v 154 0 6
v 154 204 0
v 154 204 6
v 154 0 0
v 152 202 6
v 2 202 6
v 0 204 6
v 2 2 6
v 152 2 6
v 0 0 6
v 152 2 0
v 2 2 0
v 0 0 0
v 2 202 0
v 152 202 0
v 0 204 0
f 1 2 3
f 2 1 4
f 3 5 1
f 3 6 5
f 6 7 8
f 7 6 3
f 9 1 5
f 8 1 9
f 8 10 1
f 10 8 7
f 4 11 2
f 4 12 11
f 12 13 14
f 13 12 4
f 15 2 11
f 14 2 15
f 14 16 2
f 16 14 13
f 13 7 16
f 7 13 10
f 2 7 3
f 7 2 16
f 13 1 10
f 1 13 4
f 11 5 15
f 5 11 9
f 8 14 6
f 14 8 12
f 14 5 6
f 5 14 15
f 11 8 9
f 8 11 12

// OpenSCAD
inner_x = 150;
inner_y = 200;
inner_z = 6;

wall_thickness = 2;

outer_x = inner_x + (wall_thickness * 2);
outer_y = inner_y + (wall_thickness * 2);
outer_z = inner_z;

difference() {
    cube([outer_x, outer_y, outer_z]);
    translate([wall_thickness, wall_thickness, 0]) {
        cube([inner_x, inner_y, inner_z]);
    }
}
